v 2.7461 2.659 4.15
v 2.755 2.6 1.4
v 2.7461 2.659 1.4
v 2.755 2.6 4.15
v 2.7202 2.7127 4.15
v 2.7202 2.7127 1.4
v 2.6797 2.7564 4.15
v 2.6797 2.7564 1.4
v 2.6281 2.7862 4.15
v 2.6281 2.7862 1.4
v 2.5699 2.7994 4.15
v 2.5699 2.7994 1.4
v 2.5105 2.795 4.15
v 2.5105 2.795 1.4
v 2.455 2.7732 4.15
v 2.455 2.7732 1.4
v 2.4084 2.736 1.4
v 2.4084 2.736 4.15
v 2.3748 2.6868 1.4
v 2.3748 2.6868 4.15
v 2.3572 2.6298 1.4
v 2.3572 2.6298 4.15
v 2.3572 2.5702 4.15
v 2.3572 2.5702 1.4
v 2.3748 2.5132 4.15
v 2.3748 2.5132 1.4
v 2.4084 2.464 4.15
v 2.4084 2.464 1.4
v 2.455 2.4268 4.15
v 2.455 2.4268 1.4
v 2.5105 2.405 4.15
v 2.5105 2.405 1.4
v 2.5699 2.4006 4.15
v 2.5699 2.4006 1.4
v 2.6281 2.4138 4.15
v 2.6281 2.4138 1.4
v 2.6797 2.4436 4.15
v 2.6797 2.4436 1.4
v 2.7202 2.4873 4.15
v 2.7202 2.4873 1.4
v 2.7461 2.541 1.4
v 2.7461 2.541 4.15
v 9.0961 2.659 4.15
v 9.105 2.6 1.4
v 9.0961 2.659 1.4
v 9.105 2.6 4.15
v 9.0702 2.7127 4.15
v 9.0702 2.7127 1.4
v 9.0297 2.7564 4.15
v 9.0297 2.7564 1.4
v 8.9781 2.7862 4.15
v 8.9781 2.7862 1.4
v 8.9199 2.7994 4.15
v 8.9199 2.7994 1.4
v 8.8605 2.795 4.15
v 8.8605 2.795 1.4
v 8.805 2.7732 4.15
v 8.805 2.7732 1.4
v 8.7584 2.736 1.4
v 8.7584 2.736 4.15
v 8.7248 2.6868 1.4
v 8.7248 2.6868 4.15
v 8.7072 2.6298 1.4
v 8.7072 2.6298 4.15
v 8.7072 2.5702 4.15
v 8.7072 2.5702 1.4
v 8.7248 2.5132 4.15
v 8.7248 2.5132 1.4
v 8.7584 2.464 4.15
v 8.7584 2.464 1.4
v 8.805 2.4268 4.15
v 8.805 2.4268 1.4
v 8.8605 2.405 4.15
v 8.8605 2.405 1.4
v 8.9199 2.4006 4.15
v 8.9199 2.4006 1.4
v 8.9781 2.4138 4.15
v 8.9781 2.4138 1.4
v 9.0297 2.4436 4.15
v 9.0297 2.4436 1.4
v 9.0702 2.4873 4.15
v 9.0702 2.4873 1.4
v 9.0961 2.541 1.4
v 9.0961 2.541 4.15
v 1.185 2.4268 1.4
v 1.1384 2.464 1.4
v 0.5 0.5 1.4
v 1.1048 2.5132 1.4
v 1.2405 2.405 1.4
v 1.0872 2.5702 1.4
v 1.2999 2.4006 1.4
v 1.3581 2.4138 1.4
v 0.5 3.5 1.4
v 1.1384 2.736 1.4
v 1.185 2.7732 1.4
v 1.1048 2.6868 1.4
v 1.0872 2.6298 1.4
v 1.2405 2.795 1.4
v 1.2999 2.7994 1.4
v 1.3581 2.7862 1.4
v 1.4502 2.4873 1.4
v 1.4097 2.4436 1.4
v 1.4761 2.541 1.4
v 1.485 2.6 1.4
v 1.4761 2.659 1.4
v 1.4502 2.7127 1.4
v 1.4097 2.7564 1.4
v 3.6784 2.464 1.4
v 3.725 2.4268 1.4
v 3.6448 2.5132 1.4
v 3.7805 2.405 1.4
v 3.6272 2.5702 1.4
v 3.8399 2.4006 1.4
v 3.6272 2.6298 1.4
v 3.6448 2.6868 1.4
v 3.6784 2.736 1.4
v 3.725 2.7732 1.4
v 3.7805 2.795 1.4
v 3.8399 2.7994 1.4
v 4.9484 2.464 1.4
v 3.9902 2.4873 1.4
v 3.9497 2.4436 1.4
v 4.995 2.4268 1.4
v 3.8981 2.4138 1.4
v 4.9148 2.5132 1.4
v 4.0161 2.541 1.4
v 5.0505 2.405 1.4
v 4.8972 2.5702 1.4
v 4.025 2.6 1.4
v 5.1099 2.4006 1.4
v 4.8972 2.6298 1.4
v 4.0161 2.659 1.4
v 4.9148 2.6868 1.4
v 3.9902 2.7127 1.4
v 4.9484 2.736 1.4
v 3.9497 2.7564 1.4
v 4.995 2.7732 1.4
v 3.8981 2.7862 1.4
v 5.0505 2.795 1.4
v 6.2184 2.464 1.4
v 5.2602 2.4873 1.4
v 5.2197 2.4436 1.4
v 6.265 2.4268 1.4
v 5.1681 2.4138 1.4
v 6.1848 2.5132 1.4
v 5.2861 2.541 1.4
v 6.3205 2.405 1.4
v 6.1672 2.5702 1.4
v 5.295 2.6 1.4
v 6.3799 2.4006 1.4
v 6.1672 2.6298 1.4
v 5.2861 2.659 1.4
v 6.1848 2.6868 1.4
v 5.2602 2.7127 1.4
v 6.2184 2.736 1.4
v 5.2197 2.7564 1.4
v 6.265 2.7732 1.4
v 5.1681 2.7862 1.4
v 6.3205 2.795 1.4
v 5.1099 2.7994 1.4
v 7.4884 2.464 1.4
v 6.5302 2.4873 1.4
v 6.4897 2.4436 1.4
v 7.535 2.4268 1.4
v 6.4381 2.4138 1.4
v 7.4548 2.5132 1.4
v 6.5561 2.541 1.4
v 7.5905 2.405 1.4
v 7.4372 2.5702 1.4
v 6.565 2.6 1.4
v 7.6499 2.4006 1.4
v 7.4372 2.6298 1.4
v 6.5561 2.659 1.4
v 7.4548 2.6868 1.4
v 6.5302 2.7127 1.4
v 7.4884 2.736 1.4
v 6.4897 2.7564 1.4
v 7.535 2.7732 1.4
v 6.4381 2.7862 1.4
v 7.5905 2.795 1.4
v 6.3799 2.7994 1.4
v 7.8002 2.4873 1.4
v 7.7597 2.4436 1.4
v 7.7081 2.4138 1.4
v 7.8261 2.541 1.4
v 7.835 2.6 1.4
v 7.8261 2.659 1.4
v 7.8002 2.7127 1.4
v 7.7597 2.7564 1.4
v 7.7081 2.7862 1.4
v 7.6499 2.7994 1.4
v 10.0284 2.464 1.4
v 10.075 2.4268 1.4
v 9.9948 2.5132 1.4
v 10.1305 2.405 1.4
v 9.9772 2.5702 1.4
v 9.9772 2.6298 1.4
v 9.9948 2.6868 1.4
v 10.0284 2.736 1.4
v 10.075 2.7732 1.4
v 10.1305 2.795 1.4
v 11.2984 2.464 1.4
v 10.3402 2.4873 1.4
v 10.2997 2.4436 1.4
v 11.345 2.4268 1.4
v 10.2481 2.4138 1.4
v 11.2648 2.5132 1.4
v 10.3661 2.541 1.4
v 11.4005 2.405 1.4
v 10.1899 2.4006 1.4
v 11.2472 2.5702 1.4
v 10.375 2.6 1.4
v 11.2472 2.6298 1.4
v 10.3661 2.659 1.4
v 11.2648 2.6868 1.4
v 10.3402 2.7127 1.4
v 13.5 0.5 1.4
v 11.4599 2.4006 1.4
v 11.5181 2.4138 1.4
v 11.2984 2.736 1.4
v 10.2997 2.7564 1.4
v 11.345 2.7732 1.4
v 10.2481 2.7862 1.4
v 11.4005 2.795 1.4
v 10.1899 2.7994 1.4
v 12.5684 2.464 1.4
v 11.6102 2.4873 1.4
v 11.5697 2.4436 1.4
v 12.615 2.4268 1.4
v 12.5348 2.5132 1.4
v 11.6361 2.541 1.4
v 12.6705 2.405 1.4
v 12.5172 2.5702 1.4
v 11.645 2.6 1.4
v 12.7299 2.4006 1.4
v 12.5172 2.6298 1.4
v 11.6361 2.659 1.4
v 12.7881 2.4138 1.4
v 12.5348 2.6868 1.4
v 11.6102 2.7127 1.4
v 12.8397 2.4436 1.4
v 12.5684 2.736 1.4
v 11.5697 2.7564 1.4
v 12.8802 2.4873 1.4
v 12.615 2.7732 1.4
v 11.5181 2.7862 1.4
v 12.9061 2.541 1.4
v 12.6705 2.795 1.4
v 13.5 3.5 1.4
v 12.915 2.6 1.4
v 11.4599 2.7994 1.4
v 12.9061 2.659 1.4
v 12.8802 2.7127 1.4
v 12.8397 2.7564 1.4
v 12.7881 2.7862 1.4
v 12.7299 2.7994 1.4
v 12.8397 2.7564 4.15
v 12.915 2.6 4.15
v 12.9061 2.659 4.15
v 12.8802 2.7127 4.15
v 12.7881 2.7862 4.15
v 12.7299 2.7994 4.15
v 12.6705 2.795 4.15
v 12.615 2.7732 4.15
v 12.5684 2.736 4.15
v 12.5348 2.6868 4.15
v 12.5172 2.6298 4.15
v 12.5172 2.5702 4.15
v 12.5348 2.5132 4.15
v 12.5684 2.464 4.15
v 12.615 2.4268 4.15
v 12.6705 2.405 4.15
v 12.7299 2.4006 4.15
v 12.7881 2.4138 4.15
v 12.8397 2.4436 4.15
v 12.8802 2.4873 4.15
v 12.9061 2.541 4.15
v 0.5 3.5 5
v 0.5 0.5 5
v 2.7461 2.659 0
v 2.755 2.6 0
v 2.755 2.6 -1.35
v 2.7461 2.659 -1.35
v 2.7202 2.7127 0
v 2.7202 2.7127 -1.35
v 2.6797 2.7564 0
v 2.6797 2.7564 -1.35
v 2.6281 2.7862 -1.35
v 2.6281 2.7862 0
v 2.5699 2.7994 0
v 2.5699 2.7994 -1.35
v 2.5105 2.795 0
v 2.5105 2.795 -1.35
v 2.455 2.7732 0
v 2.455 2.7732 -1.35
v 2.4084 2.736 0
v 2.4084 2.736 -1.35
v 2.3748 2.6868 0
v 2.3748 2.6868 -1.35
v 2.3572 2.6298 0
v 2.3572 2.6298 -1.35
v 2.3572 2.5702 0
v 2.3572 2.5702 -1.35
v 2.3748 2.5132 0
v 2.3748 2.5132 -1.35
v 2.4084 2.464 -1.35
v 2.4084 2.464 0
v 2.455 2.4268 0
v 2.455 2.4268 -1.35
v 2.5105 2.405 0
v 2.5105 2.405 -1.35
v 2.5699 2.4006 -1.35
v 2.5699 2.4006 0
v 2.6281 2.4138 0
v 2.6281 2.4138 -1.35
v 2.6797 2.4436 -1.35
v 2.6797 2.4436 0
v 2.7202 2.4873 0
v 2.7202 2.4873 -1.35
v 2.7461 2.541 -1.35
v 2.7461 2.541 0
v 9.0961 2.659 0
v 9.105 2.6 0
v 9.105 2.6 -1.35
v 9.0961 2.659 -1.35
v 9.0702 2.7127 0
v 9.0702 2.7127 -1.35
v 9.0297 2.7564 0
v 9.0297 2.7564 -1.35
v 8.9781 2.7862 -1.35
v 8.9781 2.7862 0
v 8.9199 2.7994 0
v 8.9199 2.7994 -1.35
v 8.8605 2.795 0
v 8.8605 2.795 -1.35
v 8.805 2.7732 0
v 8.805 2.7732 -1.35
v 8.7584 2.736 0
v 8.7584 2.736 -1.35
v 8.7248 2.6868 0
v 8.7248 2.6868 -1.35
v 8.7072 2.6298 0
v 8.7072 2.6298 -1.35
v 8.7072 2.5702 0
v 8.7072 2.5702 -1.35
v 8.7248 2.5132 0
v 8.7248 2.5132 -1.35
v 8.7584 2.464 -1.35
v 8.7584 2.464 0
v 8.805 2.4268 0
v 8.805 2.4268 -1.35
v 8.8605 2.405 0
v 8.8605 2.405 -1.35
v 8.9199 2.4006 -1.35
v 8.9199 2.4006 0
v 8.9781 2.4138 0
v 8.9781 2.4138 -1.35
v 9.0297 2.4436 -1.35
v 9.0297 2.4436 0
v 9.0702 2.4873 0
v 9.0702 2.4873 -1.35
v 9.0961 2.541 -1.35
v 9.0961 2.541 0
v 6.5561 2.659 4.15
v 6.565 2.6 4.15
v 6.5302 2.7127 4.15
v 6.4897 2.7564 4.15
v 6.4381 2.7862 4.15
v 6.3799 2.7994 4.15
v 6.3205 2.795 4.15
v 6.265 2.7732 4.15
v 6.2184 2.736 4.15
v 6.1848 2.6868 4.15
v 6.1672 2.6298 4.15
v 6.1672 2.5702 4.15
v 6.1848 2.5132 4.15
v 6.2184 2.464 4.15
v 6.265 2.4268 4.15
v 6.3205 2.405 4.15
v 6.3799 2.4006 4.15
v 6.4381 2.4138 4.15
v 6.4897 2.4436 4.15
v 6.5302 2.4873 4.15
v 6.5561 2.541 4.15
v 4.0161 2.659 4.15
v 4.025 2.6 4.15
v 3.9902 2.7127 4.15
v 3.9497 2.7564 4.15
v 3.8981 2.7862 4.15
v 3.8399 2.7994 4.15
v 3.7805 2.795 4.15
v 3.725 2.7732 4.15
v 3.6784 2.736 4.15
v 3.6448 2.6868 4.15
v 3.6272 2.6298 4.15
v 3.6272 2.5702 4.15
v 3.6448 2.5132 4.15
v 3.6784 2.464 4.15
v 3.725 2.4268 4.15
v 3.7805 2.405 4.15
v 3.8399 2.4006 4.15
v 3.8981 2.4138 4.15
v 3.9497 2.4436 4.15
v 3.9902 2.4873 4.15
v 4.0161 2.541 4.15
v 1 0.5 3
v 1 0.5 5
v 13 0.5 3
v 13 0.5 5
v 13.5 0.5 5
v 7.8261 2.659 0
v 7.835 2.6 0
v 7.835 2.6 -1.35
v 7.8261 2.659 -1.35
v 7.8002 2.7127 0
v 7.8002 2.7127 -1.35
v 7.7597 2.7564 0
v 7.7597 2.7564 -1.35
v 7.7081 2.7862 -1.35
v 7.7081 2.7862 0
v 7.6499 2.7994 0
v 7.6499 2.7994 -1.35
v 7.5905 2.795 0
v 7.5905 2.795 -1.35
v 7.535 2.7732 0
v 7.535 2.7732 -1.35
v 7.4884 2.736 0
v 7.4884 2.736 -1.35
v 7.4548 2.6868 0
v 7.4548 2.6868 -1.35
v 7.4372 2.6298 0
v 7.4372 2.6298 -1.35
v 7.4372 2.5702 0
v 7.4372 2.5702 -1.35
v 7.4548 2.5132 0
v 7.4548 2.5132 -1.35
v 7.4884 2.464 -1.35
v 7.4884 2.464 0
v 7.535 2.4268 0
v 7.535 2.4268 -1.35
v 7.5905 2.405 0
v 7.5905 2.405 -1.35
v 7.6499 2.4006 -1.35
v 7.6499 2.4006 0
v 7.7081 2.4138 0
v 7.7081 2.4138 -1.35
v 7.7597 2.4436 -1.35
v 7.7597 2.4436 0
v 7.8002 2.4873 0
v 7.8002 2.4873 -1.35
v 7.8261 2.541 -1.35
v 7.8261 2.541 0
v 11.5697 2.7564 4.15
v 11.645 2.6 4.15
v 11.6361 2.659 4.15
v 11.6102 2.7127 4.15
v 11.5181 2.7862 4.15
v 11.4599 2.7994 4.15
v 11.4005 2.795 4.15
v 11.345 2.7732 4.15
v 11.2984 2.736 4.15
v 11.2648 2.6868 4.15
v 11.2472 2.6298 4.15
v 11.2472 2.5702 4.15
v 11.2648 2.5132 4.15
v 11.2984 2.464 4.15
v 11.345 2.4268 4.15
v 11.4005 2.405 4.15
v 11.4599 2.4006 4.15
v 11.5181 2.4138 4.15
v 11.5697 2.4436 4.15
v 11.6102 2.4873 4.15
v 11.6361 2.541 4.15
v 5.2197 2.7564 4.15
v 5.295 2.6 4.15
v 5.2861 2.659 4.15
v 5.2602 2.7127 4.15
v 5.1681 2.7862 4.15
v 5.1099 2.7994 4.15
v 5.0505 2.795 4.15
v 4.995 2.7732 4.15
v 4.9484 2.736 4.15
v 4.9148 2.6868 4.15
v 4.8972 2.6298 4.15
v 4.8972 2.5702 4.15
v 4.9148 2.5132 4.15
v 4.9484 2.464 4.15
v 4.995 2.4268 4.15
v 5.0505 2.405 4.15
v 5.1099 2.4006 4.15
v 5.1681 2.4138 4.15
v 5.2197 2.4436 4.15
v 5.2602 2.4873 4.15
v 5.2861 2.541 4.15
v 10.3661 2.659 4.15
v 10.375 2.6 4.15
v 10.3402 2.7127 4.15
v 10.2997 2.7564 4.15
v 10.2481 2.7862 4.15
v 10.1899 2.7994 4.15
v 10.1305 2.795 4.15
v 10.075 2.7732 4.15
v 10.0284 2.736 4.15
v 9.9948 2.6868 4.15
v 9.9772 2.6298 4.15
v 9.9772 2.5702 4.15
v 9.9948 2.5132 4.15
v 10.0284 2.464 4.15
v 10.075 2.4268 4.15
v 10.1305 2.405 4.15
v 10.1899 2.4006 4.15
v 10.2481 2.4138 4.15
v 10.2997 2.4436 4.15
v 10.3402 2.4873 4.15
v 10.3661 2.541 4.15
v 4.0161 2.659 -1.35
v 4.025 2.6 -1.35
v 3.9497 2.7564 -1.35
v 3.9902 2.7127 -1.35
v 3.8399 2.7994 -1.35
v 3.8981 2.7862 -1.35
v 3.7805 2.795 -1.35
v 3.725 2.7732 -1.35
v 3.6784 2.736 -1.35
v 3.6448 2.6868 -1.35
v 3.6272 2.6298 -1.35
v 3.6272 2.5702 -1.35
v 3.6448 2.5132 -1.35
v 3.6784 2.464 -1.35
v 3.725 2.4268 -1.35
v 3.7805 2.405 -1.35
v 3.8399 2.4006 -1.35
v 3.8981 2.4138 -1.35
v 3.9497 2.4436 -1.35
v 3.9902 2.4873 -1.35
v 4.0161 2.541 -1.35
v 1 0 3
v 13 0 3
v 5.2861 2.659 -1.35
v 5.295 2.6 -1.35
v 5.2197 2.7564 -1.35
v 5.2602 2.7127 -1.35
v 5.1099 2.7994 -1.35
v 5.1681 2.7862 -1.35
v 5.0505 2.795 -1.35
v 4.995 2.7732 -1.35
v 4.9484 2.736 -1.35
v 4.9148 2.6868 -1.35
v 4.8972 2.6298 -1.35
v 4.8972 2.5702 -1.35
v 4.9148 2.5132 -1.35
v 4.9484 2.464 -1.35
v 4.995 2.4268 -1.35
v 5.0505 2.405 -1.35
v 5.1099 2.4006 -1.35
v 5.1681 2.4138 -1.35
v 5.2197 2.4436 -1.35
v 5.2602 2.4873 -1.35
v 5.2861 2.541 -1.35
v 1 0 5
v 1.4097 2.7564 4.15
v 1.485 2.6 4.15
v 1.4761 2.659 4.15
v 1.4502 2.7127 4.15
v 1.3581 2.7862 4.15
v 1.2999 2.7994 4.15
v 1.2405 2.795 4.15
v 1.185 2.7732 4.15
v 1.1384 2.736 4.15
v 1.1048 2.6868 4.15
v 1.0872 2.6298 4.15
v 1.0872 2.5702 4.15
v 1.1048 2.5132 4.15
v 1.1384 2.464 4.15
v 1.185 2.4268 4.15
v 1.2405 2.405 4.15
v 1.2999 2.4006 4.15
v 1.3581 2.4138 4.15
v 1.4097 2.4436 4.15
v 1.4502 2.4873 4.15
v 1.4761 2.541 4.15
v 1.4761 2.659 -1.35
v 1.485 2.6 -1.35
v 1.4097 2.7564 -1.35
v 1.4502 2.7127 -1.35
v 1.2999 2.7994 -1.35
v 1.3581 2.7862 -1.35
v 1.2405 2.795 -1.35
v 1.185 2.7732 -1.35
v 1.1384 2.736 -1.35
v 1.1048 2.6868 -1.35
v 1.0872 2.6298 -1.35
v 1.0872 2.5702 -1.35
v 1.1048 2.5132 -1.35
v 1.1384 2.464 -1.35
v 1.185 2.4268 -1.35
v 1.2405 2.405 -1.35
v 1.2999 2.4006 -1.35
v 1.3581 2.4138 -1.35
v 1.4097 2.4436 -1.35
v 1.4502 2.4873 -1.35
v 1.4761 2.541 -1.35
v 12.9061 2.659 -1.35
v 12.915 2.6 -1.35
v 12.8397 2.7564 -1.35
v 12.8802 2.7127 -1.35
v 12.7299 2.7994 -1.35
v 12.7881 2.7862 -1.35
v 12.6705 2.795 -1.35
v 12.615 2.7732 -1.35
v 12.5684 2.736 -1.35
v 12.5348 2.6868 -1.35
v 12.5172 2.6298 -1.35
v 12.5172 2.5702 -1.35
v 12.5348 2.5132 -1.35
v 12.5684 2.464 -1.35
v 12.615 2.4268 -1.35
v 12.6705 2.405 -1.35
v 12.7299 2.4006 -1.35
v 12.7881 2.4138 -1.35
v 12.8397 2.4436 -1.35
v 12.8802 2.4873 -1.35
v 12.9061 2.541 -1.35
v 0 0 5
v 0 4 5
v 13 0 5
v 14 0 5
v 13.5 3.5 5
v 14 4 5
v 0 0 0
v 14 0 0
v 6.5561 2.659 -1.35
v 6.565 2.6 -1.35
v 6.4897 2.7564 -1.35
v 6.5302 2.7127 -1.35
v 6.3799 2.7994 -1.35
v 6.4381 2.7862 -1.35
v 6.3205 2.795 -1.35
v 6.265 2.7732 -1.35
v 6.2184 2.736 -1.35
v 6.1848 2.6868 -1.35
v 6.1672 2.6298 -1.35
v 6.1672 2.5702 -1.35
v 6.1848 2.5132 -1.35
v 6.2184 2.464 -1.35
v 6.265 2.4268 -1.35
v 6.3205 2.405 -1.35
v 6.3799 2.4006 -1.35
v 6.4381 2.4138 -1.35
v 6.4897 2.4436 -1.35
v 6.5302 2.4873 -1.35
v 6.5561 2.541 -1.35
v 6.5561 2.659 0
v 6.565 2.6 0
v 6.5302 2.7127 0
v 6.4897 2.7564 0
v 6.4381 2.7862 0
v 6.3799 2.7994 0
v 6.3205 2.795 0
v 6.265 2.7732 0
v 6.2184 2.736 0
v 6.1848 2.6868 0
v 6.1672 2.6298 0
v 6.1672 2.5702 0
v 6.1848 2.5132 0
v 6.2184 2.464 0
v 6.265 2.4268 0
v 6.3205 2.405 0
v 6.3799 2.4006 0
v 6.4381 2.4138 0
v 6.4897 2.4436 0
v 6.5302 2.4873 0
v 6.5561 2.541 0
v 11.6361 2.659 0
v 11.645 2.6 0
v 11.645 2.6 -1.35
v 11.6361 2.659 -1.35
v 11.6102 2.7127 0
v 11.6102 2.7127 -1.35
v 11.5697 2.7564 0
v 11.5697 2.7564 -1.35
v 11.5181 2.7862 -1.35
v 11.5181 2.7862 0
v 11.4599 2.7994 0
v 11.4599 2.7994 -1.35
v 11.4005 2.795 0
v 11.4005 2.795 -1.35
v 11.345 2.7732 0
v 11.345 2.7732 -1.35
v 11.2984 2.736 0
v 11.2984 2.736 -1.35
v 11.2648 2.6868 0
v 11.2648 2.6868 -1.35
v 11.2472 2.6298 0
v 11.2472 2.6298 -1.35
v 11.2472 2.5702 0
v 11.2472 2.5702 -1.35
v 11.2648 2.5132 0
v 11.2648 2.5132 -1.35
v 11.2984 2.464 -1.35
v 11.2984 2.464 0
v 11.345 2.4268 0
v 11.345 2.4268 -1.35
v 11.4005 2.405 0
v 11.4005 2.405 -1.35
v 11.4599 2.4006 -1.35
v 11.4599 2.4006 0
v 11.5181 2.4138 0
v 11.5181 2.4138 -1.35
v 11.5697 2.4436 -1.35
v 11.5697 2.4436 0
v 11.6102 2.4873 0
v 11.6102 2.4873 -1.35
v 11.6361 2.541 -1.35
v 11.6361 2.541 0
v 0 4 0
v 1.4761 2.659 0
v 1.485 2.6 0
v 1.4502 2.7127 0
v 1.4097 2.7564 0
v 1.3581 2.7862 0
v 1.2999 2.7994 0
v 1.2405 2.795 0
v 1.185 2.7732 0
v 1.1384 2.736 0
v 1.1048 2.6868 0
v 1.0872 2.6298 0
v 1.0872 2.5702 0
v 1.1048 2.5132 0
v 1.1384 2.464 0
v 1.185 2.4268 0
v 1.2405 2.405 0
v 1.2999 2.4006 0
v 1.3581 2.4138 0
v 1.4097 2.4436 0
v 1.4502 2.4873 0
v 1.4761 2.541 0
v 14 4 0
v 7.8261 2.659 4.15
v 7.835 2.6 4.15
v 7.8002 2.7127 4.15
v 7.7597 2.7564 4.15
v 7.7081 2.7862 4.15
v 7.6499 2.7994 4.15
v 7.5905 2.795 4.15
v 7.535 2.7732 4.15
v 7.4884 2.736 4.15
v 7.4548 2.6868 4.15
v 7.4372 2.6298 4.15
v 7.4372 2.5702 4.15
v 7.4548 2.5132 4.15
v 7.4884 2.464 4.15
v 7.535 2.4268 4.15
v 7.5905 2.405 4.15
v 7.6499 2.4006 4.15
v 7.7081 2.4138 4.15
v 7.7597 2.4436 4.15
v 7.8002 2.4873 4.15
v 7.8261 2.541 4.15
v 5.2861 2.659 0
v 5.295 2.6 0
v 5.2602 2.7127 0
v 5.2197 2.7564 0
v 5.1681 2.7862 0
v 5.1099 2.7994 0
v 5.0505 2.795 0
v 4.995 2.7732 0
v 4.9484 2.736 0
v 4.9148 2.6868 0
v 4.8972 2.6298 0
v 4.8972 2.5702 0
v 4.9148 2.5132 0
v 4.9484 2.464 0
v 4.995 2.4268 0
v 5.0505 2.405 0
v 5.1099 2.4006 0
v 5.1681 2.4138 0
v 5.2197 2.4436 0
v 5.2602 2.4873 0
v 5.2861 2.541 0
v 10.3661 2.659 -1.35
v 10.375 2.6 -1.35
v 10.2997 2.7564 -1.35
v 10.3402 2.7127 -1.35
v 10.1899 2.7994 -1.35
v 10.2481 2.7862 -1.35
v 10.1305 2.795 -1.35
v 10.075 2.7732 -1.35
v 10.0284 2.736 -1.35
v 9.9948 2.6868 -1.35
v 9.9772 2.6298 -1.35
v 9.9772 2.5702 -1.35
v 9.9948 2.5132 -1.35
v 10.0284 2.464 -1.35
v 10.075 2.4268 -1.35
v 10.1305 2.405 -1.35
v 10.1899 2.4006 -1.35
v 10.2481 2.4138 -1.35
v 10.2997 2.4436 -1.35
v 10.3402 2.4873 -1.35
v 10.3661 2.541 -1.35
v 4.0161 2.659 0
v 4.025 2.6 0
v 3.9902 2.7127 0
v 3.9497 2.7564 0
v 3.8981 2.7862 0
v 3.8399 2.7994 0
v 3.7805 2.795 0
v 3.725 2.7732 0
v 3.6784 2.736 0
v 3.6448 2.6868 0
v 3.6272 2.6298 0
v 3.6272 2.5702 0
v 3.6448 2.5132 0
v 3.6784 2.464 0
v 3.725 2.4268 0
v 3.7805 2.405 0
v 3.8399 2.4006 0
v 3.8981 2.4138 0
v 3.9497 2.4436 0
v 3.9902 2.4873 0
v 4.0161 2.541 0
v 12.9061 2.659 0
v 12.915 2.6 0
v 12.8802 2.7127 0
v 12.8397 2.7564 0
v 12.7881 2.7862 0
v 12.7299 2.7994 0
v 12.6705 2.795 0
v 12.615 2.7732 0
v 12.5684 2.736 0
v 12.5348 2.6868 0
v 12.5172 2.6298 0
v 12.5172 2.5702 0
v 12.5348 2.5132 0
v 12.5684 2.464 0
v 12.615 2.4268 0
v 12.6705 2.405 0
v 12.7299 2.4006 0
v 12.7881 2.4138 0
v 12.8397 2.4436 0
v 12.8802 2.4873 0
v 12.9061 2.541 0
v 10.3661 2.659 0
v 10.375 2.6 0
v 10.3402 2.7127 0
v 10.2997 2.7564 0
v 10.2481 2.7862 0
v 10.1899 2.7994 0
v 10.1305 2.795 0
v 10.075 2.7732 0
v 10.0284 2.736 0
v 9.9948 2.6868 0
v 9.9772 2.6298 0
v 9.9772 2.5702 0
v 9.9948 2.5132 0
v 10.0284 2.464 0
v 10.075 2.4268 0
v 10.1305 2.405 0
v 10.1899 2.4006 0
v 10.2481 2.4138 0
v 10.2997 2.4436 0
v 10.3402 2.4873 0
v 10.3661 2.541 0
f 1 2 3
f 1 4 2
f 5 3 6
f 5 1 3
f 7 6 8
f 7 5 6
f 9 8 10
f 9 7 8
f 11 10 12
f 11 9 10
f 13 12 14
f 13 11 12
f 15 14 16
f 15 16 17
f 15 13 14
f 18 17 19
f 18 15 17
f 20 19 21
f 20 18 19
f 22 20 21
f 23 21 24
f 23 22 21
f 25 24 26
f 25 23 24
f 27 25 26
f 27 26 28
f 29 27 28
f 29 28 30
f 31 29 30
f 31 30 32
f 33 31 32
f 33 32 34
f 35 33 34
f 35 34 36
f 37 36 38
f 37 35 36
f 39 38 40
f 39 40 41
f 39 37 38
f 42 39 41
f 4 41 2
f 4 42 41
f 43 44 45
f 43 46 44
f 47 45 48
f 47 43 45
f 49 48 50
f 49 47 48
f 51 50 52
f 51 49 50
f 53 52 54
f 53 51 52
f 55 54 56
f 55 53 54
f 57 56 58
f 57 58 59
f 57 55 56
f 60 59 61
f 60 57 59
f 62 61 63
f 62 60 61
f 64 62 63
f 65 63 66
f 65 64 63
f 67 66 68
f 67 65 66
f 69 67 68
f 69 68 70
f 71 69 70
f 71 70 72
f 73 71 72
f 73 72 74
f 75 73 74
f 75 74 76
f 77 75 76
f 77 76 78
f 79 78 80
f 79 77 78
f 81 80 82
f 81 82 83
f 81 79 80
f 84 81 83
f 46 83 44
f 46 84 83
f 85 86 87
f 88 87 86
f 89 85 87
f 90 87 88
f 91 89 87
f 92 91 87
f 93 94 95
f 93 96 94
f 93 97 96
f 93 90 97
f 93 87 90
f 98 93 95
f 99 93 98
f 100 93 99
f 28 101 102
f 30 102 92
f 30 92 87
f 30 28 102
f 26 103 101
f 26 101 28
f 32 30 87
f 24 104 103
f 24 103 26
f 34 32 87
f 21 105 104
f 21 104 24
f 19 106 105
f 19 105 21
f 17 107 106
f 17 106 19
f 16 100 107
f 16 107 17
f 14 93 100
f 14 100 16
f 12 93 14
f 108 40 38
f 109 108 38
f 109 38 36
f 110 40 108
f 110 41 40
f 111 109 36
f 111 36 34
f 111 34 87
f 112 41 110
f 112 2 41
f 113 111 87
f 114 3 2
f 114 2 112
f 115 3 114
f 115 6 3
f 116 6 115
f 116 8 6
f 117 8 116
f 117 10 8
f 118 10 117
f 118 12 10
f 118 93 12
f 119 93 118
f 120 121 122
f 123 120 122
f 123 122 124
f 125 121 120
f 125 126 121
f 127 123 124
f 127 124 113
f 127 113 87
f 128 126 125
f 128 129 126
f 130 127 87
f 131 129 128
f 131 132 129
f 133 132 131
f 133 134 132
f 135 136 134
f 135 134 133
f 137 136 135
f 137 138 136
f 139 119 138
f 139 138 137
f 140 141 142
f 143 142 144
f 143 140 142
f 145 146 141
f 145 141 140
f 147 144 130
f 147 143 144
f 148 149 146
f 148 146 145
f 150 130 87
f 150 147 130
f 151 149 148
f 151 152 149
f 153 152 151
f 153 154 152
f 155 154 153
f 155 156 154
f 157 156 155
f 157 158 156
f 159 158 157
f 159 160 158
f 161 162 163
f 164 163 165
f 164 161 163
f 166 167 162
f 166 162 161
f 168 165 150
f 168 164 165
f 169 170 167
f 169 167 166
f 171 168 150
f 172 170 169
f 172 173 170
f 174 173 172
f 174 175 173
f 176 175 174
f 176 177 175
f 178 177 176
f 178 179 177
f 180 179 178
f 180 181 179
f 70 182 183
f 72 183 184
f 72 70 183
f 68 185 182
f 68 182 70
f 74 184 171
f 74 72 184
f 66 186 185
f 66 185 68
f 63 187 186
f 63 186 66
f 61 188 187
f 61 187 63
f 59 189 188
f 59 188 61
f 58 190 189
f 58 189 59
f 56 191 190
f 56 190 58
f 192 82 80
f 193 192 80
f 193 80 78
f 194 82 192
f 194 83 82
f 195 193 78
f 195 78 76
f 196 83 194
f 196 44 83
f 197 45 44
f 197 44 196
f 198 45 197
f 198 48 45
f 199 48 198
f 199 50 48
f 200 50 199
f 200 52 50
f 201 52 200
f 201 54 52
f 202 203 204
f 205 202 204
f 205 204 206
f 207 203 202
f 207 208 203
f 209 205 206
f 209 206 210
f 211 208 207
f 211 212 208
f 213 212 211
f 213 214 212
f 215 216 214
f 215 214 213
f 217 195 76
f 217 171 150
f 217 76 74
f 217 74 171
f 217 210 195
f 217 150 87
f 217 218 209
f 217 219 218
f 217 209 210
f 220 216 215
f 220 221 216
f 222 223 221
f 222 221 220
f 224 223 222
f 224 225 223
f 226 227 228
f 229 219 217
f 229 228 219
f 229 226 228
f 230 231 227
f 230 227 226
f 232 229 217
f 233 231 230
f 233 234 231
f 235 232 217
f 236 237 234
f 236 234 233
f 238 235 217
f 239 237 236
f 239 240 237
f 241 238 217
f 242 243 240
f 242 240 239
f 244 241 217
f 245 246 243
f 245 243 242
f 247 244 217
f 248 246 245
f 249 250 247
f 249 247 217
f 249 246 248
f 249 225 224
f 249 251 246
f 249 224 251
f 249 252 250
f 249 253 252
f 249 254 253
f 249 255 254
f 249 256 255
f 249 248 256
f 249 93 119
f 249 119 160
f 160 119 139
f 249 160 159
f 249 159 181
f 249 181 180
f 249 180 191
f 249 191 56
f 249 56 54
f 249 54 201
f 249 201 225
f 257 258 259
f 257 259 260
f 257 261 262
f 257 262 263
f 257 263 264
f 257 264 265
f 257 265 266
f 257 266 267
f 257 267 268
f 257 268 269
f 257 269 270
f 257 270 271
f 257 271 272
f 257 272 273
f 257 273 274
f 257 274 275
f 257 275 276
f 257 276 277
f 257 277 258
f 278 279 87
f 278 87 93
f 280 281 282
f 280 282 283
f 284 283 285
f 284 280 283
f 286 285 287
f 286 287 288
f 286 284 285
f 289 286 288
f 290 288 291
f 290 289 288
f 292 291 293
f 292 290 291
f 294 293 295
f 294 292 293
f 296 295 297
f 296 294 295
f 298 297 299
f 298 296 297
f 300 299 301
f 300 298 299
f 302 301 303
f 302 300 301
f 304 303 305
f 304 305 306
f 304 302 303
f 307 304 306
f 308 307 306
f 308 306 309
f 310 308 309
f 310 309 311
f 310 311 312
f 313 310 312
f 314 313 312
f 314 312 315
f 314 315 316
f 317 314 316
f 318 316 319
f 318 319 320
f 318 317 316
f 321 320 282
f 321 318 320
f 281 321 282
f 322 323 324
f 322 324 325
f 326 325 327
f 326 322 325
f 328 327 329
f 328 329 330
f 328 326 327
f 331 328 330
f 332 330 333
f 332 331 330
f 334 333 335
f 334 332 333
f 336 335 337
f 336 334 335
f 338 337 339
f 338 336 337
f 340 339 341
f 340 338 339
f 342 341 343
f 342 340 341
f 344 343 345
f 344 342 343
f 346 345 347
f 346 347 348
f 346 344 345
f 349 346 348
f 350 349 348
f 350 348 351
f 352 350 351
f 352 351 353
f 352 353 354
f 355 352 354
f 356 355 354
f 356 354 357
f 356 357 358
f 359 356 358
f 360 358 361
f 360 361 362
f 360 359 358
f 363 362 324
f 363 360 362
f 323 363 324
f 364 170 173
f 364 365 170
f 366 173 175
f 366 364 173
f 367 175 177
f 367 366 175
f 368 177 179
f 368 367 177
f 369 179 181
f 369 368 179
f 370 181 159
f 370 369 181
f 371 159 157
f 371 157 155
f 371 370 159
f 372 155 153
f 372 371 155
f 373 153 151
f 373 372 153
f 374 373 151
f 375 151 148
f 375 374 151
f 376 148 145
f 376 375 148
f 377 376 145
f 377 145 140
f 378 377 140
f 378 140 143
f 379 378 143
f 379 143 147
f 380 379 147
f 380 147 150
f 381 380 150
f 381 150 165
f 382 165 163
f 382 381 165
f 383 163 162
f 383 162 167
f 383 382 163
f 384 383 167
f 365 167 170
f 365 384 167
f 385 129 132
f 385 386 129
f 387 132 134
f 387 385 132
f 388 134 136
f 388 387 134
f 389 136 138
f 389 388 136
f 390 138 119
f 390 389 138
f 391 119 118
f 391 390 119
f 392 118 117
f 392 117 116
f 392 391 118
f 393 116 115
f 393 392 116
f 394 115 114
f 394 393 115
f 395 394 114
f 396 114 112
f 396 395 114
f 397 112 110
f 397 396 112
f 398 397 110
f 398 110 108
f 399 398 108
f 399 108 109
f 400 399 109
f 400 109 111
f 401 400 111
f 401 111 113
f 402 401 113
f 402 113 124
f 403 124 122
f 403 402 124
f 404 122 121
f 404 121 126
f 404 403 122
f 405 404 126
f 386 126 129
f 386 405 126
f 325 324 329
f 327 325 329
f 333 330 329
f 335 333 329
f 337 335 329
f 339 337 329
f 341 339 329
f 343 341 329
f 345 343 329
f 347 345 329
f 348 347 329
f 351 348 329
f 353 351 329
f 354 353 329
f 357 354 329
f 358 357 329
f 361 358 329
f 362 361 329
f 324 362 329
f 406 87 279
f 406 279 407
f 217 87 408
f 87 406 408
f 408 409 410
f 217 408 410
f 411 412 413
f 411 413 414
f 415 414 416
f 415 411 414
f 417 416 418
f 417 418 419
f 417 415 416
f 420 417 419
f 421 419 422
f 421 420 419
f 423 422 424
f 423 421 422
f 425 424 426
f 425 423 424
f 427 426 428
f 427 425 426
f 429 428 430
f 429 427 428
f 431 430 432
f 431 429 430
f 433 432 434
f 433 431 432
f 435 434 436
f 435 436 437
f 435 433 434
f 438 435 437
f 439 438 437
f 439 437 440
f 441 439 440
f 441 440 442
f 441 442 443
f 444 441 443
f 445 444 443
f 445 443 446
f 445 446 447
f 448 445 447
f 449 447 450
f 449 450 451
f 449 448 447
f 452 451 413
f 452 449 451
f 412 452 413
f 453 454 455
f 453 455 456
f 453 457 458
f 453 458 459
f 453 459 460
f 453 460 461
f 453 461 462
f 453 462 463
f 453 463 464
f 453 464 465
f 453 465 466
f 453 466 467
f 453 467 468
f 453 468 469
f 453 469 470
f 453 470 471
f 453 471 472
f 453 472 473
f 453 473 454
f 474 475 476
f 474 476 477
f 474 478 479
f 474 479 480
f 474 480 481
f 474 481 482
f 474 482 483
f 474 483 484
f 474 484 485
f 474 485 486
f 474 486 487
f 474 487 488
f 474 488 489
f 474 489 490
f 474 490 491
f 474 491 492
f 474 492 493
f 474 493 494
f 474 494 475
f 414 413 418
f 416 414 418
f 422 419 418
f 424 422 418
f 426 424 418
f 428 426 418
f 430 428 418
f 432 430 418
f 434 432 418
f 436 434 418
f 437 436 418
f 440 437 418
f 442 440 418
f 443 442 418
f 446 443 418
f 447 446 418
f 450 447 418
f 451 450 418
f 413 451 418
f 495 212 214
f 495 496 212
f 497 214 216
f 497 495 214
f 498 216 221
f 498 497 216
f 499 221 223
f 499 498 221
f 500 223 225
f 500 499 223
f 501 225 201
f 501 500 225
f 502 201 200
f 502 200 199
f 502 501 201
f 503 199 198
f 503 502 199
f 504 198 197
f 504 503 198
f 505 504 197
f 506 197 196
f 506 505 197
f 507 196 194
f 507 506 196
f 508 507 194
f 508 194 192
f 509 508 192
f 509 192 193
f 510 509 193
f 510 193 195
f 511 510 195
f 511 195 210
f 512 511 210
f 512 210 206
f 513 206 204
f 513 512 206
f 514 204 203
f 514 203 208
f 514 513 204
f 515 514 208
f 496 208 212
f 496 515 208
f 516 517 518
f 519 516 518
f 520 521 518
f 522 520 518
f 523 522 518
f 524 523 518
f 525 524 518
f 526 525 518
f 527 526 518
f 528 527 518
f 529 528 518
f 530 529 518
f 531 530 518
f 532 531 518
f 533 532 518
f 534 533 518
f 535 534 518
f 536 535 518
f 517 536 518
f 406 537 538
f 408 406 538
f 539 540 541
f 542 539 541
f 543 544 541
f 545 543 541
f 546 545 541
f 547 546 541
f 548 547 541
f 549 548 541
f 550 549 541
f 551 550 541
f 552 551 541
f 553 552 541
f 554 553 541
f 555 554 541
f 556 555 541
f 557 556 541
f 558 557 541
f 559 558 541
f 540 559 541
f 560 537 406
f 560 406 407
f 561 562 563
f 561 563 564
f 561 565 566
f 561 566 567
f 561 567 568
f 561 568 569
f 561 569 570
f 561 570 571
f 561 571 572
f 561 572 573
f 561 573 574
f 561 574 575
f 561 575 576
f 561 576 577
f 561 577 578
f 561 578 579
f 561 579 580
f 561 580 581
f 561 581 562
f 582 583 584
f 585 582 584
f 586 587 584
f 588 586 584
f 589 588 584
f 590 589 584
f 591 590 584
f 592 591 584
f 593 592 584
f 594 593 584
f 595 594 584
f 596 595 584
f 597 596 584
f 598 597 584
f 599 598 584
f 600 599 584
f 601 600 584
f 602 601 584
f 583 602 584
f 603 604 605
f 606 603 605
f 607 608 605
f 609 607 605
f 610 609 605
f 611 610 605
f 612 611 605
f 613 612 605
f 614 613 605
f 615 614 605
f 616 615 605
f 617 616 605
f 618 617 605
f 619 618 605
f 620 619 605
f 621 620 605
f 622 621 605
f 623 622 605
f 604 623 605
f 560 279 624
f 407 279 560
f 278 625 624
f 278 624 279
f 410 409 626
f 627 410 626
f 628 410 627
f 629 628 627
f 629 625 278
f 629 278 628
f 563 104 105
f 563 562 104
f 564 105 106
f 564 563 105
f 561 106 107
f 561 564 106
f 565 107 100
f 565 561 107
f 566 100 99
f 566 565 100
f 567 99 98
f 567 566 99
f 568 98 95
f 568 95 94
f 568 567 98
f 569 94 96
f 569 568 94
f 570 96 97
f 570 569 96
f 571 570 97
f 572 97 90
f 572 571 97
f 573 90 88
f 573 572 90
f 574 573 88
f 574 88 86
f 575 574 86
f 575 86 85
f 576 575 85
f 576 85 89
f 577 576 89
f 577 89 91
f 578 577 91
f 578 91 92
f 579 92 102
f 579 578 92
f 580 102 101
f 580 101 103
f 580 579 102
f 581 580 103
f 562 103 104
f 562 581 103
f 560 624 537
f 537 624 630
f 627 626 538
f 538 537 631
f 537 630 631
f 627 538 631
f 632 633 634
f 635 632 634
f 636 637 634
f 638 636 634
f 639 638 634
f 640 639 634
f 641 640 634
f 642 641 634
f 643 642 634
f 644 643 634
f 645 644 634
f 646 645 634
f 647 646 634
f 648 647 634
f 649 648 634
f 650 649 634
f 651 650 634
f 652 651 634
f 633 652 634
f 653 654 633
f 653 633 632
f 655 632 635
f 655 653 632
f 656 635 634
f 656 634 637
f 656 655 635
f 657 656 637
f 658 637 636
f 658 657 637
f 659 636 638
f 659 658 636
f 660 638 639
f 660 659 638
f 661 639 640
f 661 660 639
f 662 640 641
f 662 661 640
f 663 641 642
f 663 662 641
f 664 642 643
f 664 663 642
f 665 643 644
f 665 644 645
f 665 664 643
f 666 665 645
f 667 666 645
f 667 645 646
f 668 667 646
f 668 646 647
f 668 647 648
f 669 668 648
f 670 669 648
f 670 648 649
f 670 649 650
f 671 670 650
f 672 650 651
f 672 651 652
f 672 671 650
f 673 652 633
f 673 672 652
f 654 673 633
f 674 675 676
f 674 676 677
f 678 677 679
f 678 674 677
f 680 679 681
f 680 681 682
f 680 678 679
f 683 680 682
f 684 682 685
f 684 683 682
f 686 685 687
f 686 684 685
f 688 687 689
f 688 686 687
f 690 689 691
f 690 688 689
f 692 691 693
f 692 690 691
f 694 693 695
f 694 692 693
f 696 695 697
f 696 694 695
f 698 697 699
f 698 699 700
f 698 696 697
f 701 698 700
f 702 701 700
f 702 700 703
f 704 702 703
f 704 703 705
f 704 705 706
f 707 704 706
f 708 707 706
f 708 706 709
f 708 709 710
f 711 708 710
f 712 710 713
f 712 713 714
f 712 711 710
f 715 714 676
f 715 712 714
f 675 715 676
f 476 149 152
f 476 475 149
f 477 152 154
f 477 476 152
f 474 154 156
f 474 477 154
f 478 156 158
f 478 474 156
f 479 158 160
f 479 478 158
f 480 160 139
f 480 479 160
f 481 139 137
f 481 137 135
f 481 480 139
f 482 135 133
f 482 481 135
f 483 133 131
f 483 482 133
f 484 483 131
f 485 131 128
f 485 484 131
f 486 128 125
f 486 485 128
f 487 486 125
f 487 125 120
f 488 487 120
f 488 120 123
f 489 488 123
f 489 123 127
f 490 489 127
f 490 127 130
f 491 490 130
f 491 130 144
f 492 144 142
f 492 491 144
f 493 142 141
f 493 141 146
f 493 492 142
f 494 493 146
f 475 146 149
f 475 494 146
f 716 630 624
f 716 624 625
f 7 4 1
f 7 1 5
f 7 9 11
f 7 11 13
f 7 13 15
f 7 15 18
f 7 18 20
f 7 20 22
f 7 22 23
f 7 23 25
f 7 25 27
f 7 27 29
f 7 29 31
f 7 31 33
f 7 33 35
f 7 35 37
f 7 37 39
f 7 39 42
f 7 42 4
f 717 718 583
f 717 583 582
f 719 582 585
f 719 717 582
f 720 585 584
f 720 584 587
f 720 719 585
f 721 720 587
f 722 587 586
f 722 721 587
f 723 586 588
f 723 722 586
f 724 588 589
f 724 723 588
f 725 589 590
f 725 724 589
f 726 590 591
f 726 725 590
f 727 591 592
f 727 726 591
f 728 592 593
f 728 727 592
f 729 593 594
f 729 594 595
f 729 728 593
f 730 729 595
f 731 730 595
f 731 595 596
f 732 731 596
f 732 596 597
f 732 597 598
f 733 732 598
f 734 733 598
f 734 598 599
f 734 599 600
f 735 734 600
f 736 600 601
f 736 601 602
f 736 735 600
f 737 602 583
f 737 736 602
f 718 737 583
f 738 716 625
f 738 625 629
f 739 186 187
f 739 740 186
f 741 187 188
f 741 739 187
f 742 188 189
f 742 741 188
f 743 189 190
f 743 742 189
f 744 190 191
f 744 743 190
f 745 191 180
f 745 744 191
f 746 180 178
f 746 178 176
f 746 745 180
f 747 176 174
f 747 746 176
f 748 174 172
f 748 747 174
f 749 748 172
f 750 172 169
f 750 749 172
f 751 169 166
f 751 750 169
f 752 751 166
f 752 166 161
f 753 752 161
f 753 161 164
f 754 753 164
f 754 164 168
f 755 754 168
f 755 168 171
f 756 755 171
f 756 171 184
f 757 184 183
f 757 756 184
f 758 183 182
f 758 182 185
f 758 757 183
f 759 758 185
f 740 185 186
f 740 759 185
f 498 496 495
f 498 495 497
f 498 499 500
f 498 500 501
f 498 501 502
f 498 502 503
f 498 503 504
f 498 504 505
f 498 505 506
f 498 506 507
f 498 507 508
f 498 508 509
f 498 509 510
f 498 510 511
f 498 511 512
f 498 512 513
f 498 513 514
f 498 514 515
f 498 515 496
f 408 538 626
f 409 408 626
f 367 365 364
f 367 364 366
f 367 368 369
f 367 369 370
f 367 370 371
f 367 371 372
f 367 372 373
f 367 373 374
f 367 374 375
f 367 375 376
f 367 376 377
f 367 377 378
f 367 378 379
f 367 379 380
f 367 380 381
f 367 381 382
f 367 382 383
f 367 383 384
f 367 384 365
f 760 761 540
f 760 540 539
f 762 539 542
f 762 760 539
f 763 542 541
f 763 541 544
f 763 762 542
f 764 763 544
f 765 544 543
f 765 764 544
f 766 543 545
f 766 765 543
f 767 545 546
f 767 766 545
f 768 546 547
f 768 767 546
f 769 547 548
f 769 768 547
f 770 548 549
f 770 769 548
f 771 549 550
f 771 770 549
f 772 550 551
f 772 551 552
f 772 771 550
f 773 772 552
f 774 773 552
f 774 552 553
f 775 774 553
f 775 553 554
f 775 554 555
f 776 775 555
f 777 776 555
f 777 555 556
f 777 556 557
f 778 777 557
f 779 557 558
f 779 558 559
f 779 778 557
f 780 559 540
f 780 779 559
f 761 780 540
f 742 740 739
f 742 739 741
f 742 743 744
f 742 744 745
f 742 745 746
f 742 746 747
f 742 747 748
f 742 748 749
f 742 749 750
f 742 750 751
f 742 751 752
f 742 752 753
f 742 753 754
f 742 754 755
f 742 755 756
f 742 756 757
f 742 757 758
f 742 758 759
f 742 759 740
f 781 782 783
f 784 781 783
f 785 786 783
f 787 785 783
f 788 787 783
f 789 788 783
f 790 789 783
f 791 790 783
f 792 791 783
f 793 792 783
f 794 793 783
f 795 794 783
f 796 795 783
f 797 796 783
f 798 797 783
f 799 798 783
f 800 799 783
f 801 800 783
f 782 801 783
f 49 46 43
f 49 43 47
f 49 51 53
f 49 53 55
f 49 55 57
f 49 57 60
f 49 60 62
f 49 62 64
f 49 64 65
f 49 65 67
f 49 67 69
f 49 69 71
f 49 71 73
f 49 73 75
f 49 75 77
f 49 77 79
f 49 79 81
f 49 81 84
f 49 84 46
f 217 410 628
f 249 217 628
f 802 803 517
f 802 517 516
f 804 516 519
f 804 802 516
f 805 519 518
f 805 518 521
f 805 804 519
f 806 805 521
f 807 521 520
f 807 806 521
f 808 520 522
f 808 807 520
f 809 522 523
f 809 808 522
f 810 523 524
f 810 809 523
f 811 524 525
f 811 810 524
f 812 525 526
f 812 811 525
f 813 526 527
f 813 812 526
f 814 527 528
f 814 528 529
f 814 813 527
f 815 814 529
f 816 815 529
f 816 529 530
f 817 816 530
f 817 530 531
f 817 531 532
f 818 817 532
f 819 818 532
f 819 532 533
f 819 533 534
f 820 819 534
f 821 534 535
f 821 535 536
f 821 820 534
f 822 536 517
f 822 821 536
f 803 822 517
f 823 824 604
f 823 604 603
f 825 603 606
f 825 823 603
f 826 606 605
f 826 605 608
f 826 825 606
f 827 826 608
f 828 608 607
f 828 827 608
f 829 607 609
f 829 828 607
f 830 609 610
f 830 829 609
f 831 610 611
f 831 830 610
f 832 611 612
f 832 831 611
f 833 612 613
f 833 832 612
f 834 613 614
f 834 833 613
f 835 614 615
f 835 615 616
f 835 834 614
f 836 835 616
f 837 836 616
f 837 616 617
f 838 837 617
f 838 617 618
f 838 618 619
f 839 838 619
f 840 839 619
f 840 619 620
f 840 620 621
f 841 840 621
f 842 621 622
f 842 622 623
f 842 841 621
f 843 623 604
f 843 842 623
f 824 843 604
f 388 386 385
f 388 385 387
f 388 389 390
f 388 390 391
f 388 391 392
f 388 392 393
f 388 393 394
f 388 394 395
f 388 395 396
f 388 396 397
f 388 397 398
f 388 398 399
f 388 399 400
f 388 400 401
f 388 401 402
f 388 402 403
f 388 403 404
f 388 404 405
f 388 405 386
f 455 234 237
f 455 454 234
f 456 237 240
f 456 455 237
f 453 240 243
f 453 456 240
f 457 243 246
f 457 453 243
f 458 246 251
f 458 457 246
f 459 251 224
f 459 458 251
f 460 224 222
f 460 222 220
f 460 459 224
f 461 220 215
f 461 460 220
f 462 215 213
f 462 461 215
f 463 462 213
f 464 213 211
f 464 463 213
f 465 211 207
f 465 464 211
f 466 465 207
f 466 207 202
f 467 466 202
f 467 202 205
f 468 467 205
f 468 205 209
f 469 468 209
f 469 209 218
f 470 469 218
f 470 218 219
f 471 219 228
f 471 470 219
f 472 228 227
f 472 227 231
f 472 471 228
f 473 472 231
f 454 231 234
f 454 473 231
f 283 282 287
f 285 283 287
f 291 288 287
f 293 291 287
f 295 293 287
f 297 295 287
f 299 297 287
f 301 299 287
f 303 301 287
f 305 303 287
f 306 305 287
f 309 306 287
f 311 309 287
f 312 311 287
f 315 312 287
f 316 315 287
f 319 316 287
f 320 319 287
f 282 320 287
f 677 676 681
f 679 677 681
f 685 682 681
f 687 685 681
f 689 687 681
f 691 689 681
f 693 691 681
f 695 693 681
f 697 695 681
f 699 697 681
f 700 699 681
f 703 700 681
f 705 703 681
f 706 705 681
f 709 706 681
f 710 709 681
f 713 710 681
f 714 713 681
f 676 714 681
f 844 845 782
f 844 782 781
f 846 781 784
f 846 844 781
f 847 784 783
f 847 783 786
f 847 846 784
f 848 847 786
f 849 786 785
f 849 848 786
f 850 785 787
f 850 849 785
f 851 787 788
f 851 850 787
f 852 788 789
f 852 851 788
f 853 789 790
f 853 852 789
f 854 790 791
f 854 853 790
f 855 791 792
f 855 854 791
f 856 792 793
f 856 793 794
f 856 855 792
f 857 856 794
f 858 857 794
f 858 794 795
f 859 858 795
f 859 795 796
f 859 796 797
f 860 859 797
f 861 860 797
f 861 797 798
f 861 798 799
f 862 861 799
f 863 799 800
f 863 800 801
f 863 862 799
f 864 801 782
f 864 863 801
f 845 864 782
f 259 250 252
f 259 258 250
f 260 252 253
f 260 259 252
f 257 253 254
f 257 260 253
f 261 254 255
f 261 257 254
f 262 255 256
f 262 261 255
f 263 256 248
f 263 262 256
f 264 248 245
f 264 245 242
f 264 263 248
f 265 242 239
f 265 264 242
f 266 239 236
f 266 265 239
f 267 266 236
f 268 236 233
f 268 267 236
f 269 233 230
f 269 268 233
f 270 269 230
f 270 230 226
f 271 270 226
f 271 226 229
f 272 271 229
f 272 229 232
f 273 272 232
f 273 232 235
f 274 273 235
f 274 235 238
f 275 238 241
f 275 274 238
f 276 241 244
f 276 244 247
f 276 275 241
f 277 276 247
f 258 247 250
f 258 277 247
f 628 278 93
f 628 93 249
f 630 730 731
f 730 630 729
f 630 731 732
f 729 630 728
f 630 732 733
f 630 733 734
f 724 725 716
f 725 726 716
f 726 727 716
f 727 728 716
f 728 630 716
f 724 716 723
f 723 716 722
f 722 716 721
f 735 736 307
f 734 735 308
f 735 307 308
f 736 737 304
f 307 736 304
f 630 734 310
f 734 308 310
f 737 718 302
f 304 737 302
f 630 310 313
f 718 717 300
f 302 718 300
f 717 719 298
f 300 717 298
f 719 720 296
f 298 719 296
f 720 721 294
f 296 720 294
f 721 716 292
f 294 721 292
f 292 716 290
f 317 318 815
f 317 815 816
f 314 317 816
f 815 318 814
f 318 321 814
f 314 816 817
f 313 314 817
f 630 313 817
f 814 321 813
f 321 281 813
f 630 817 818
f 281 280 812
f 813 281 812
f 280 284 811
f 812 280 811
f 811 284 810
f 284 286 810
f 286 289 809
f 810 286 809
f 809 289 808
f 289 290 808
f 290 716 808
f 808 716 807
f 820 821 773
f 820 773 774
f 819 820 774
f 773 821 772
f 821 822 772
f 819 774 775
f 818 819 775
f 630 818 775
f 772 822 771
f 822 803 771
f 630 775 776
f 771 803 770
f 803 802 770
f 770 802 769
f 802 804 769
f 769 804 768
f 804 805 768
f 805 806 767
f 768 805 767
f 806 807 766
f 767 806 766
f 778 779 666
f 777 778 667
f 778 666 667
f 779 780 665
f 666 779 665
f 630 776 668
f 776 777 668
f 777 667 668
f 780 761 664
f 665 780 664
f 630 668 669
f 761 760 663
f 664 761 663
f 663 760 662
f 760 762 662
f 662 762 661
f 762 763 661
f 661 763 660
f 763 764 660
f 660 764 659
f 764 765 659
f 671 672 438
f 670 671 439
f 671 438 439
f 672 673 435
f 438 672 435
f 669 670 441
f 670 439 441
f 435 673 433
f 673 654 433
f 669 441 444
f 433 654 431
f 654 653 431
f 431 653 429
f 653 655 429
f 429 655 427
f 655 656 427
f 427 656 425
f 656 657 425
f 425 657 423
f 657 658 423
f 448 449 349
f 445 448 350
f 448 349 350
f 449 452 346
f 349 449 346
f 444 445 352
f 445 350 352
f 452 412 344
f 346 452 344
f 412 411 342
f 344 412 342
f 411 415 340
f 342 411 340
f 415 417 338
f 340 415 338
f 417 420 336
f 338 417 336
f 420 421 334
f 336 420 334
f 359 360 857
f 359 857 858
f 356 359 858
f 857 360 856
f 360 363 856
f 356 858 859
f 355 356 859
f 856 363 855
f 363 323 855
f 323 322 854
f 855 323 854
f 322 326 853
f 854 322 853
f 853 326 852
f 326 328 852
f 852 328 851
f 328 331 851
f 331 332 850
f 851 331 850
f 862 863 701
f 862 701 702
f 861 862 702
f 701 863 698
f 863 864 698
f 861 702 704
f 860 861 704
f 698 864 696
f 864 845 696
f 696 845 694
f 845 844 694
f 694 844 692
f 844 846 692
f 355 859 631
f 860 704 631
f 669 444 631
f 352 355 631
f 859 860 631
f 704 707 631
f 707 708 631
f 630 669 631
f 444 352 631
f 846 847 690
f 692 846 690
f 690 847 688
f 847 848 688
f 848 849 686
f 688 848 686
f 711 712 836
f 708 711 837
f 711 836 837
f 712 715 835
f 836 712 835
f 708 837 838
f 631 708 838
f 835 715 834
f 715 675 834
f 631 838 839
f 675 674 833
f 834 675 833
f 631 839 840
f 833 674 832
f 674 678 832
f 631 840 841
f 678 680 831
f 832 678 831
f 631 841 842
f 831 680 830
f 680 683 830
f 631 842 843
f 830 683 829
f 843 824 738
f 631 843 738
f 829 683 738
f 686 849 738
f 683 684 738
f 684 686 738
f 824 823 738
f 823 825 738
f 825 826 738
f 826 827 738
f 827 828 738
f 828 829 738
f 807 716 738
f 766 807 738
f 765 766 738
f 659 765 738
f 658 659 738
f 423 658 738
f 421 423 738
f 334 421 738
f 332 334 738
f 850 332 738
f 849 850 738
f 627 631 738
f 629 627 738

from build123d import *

# Parameters (mm, degrees)
SKETCH_1_W             = 14
SKETCH_1_H             = 4
EXTRUDE_1_DEPTH        = 5
SKETCH_2_W             = 13
SKETCH_2_H             = 3
CUT_EXTRUDE_1_DEPTH    = 3.6
CUT_EXTRUDE_2_REACH    = 17.395
SKETCH_3_W             = 12
SKETCH_3_H             = 3.737461846
SKETCH_4_R             = 0.2
EXTRUDE_2_DEPTH        = 2.75
PATTERN_LINEAR_1_COUNT = 10
PATTERN_LINEAR_1_PITCH = 1.27


with BuildPart() as part:
    # 草图1 → 凸台-拉伸1 (new body)
    with BuildSketch(Plane.XY):
        with Locations((7, 2)):
            Rectangle(SKETCH_1_W, SKETCH_1_H)
    extrude(amount=EXTRUDE_1_DEPTH)

    # 草图2 → 切除-拉伸1 (cut)
    with BuildSketch(Plane.XY.offset(5)):
        with Locations((7, 2)):
            Rectangle(SKETCH_2_W, SKETCH_2_H)
    extrude(amount=-CUT_EXTRUDE_1_DEPTH, mode=Mode.SUBTRACT)

    # 草图3 → 切除-拉伸2 (cut, up to next)
    with BuildSketch(Plane.XZ, mode=Mode.PRIVATE) as cut_extrude_2_sk1:
        with Locations((7, 4.868730923)):
            Rectangle(SKETCH_3_W, SKETCH_3_H)
    cut_extrude_2_tool1 = extrude(cut_extrude_2_sk1.sketch, amount=-CUT_EXTRUDE_2_REACH, mode=Mode.PRIVATE) & part.part
    add(cut_extrude_2_tool1.solids().sort_by_distance((7, 0, 4.868731))[0], mode=Mode.SUBTRACT)

    # 草图4 → 凸台-拉伸2 (add, symmetric)
    with BuildSketch(Plane.XY.offset(1.4)):
        with Locations((1.285, 2.6)):
            Circle(SKETCH_4_R)
    extrude_2 = extrude(amount=EXTRUDE_2_DEPTH, both=True)

    # 阵列(线性)1: 凸台-拉伸2 ×10
    with Locations(*[(i * PATTERN_LINEAR_1_PITCH, 0, 0) for i in range(1, PATTERN_LINEAR_1_COUNT)]):
        add(extrude_2)


solid = part.part
